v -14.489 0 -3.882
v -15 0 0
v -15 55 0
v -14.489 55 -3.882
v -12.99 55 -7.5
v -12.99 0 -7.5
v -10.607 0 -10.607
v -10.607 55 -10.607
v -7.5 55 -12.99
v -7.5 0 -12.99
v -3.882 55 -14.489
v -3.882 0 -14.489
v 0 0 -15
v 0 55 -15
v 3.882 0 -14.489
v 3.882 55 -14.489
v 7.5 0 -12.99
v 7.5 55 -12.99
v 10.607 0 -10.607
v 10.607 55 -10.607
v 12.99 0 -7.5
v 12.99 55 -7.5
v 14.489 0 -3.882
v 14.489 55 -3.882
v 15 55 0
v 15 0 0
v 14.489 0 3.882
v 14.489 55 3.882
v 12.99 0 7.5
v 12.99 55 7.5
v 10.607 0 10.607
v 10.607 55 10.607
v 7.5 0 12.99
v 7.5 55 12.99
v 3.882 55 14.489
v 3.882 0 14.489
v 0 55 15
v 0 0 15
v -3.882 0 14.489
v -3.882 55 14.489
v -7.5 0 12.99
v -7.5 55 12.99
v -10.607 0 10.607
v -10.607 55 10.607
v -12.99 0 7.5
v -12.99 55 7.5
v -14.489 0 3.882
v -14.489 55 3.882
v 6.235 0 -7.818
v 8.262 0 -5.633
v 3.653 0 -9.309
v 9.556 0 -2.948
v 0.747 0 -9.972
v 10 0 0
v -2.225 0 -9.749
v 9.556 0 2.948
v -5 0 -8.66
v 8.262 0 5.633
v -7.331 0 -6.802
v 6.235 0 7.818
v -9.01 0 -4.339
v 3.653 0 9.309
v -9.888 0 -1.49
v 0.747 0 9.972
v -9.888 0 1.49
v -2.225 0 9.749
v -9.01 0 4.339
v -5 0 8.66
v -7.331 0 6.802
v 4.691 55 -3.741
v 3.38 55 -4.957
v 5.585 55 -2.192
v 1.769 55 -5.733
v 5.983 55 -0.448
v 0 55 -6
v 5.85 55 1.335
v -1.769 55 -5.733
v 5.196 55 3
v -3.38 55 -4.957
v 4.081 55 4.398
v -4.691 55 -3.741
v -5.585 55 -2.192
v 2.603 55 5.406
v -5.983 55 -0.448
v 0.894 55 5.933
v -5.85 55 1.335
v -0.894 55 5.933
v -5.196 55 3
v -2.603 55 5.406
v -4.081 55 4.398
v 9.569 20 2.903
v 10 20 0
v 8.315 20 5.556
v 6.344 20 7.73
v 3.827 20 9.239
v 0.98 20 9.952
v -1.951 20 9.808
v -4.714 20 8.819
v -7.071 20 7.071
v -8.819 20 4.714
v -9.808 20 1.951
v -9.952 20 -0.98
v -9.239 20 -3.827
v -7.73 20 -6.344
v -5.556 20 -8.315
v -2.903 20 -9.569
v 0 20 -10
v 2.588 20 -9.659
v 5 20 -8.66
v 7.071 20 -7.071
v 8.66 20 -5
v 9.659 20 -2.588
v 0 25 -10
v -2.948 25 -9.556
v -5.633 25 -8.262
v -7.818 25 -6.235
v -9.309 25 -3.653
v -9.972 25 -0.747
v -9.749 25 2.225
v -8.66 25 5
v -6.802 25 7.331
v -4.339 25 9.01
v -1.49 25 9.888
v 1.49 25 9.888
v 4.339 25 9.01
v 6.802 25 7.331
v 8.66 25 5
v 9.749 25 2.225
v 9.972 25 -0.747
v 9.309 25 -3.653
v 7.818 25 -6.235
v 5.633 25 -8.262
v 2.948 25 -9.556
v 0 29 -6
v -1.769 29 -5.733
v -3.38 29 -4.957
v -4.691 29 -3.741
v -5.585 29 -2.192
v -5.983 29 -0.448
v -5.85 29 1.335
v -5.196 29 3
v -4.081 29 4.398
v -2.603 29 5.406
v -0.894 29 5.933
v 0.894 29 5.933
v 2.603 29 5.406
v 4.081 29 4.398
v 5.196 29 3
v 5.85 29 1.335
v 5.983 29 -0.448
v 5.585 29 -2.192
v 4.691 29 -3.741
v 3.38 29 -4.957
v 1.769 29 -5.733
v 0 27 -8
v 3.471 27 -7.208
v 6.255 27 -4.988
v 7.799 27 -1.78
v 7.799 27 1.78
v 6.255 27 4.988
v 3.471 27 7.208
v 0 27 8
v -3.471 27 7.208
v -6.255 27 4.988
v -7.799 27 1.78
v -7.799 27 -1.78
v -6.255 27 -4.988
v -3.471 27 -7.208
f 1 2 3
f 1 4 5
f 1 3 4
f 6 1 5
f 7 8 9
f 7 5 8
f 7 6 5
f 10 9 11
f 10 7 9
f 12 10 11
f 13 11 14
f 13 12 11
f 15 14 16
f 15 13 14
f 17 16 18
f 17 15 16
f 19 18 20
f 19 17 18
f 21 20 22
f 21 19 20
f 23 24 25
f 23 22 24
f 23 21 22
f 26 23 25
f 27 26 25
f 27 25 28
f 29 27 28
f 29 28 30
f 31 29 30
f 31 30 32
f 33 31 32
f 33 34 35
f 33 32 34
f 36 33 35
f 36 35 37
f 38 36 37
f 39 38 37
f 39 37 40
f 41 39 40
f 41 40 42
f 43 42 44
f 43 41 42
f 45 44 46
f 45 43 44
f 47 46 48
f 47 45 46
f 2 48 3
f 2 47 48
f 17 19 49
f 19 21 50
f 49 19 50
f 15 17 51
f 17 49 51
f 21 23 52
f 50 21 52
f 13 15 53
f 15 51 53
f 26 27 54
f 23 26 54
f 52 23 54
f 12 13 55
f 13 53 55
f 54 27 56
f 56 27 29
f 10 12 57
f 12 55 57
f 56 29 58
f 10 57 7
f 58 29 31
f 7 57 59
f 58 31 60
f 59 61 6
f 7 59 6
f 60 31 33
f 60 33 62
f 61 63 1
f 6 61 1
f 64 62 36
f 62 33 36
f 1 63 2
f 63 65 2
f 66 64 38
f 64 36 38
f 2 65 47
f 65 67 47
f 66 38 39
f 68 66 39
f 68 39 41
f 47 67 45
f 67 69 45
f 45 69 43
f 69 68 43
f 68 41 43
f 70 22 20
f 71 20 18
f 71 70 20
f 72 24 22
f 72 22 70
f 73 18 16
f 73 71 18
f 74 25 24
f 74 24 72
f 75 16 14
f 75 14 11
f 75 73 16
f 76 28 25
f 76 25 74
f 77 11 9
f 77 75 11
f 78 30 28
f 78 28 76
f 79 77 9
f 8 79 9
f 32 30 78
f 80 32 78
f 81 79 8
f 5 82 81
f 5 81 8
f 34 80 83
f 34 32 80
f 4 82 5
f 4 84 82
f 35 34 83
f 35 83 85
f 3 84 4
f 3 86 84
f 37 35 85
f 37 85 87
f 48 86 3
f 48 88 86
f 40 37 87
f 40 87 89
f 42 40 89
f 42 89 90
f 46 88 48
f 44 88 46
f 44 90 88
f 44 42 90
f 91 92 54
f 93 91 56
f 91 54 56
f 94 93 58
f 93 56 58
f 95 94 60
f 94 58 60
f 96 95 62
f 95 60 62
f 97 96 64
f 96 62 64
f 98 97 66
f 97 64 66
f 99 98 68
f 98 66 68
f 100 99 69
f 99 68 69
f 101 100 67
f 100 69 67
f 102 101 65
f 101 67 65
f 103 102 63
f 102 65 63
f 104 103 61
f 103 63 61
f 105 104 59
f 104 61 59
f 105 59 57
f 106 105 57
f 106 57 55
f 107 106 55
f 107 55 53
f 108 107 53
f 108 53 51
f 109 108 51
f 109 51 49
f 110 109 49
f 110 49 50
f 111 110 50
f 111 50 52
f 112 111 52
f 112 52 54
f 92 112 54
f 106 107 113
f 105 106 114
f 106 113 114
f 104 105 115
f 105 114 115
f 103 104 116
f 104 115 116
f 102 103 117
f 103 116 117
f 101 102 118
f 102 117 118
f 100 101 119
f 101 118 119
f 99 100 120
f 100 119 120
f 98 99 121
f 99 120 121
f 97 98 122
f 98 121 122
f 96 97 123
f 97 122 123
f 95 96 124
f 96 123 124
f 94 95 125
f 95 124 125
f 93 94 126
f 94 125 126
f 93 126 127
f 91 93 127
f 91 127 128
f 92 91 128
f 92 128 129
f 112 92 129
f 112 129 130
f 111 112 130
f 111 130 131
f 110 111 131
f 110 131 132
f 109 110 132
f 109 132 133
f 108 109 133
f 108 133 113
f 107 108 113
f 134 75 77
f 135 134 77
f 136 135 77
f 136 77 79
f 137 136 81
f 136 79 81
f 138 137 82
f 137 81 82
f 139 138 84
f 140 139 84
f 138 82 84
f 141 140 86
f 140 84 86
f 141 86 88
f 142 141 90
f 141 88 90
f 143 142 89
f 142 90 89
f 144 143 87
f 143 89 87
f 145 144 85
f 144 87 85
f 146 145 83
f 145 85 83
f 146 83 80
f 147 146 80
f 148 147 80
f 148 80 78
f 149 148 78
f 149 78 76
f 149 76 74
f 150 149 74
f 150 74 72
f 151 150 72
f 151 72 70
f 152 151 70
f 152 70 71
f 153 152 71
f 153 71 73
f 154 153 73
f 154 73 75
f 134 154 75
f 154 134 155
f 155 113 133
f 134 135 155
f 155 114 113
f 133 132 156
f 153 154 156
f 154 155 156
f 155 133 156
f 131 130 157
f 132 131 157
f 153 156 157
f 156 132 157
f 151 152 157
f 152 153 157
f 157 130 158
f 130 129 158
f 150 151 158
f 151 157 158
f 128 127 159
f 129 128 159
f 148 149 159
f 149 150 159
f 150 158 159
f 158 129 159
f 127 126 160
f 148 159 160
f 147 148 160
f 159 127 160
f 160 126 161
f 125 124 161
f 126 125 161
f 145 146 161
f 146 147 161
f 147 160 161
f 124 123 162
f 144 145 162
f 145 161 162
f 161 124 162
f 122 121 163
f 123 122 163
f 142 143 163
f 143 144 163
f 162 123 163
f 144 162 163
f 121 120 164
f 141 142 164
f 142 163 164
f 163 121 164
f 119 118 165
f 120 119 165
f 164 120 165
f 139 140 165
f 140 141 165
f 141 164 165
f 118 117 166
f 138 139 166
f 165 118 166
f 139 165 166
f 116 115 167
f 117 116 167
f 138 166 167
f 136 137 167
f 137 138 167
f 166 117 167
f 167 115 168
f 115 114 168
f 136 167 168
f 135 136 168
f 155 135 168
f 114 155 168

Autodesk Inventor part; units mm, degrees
ref_plane "YZ Plane" through (0, 0, 0) normal (1, 0, 0) x (0, 1, 0)
sketch "Эскиз1" plane through (0, 0, 0) normal (0, 1, 0) x (-1, 0, 0)
  circle A0 centre (0, 0) radius 15
  dimension "d0" = 30
extrude "Выдавливание1" add sketch "Эскиз1" along normal blind 55
ref_plane "РабПлоскость1" through (0, 20, 0) normal (0, -1, 0) x (1, 0, 0)
sketch "Эскиз5" plane through (0, 20, 0) normal (0, -1, 0) x (1, 0, 0)
  point P0 (0, 0)
  point P1 (0, 0)
hole "Отверстие2" at (0, 20, 0) direction (0, 1, 0) diameter 20 depth 5
ref_plane "РабПлоскость2" through (0, 25, 0) normal (0, -1, 0) x (1, 0, 0)
sketch "Эскиз6" plane through (0, 25, 0) normal (0, -1, 0) x (1, 0, 0)
  point P0 (0, 0)
  point P1 (0, 0)
hole "Отверстие3" at (0, 25, 0) direction (0, 1, 0) diameter 12 end through all countersink diameter 20 countersink angle 90
sketch "Эскиз7" plane through (0, 0, 0) normal (0, -1, 0) x (1, 0, 0)
  circle A0 centre (0, 0) radius 10
  dimension "d24" = 20
extrude "Выдавливание2" cut sketch "Эскиз7" against normal blind 20
thread "Резьба1" size "M20x1" class "6H" standard "ISO Metric profile" length 20
